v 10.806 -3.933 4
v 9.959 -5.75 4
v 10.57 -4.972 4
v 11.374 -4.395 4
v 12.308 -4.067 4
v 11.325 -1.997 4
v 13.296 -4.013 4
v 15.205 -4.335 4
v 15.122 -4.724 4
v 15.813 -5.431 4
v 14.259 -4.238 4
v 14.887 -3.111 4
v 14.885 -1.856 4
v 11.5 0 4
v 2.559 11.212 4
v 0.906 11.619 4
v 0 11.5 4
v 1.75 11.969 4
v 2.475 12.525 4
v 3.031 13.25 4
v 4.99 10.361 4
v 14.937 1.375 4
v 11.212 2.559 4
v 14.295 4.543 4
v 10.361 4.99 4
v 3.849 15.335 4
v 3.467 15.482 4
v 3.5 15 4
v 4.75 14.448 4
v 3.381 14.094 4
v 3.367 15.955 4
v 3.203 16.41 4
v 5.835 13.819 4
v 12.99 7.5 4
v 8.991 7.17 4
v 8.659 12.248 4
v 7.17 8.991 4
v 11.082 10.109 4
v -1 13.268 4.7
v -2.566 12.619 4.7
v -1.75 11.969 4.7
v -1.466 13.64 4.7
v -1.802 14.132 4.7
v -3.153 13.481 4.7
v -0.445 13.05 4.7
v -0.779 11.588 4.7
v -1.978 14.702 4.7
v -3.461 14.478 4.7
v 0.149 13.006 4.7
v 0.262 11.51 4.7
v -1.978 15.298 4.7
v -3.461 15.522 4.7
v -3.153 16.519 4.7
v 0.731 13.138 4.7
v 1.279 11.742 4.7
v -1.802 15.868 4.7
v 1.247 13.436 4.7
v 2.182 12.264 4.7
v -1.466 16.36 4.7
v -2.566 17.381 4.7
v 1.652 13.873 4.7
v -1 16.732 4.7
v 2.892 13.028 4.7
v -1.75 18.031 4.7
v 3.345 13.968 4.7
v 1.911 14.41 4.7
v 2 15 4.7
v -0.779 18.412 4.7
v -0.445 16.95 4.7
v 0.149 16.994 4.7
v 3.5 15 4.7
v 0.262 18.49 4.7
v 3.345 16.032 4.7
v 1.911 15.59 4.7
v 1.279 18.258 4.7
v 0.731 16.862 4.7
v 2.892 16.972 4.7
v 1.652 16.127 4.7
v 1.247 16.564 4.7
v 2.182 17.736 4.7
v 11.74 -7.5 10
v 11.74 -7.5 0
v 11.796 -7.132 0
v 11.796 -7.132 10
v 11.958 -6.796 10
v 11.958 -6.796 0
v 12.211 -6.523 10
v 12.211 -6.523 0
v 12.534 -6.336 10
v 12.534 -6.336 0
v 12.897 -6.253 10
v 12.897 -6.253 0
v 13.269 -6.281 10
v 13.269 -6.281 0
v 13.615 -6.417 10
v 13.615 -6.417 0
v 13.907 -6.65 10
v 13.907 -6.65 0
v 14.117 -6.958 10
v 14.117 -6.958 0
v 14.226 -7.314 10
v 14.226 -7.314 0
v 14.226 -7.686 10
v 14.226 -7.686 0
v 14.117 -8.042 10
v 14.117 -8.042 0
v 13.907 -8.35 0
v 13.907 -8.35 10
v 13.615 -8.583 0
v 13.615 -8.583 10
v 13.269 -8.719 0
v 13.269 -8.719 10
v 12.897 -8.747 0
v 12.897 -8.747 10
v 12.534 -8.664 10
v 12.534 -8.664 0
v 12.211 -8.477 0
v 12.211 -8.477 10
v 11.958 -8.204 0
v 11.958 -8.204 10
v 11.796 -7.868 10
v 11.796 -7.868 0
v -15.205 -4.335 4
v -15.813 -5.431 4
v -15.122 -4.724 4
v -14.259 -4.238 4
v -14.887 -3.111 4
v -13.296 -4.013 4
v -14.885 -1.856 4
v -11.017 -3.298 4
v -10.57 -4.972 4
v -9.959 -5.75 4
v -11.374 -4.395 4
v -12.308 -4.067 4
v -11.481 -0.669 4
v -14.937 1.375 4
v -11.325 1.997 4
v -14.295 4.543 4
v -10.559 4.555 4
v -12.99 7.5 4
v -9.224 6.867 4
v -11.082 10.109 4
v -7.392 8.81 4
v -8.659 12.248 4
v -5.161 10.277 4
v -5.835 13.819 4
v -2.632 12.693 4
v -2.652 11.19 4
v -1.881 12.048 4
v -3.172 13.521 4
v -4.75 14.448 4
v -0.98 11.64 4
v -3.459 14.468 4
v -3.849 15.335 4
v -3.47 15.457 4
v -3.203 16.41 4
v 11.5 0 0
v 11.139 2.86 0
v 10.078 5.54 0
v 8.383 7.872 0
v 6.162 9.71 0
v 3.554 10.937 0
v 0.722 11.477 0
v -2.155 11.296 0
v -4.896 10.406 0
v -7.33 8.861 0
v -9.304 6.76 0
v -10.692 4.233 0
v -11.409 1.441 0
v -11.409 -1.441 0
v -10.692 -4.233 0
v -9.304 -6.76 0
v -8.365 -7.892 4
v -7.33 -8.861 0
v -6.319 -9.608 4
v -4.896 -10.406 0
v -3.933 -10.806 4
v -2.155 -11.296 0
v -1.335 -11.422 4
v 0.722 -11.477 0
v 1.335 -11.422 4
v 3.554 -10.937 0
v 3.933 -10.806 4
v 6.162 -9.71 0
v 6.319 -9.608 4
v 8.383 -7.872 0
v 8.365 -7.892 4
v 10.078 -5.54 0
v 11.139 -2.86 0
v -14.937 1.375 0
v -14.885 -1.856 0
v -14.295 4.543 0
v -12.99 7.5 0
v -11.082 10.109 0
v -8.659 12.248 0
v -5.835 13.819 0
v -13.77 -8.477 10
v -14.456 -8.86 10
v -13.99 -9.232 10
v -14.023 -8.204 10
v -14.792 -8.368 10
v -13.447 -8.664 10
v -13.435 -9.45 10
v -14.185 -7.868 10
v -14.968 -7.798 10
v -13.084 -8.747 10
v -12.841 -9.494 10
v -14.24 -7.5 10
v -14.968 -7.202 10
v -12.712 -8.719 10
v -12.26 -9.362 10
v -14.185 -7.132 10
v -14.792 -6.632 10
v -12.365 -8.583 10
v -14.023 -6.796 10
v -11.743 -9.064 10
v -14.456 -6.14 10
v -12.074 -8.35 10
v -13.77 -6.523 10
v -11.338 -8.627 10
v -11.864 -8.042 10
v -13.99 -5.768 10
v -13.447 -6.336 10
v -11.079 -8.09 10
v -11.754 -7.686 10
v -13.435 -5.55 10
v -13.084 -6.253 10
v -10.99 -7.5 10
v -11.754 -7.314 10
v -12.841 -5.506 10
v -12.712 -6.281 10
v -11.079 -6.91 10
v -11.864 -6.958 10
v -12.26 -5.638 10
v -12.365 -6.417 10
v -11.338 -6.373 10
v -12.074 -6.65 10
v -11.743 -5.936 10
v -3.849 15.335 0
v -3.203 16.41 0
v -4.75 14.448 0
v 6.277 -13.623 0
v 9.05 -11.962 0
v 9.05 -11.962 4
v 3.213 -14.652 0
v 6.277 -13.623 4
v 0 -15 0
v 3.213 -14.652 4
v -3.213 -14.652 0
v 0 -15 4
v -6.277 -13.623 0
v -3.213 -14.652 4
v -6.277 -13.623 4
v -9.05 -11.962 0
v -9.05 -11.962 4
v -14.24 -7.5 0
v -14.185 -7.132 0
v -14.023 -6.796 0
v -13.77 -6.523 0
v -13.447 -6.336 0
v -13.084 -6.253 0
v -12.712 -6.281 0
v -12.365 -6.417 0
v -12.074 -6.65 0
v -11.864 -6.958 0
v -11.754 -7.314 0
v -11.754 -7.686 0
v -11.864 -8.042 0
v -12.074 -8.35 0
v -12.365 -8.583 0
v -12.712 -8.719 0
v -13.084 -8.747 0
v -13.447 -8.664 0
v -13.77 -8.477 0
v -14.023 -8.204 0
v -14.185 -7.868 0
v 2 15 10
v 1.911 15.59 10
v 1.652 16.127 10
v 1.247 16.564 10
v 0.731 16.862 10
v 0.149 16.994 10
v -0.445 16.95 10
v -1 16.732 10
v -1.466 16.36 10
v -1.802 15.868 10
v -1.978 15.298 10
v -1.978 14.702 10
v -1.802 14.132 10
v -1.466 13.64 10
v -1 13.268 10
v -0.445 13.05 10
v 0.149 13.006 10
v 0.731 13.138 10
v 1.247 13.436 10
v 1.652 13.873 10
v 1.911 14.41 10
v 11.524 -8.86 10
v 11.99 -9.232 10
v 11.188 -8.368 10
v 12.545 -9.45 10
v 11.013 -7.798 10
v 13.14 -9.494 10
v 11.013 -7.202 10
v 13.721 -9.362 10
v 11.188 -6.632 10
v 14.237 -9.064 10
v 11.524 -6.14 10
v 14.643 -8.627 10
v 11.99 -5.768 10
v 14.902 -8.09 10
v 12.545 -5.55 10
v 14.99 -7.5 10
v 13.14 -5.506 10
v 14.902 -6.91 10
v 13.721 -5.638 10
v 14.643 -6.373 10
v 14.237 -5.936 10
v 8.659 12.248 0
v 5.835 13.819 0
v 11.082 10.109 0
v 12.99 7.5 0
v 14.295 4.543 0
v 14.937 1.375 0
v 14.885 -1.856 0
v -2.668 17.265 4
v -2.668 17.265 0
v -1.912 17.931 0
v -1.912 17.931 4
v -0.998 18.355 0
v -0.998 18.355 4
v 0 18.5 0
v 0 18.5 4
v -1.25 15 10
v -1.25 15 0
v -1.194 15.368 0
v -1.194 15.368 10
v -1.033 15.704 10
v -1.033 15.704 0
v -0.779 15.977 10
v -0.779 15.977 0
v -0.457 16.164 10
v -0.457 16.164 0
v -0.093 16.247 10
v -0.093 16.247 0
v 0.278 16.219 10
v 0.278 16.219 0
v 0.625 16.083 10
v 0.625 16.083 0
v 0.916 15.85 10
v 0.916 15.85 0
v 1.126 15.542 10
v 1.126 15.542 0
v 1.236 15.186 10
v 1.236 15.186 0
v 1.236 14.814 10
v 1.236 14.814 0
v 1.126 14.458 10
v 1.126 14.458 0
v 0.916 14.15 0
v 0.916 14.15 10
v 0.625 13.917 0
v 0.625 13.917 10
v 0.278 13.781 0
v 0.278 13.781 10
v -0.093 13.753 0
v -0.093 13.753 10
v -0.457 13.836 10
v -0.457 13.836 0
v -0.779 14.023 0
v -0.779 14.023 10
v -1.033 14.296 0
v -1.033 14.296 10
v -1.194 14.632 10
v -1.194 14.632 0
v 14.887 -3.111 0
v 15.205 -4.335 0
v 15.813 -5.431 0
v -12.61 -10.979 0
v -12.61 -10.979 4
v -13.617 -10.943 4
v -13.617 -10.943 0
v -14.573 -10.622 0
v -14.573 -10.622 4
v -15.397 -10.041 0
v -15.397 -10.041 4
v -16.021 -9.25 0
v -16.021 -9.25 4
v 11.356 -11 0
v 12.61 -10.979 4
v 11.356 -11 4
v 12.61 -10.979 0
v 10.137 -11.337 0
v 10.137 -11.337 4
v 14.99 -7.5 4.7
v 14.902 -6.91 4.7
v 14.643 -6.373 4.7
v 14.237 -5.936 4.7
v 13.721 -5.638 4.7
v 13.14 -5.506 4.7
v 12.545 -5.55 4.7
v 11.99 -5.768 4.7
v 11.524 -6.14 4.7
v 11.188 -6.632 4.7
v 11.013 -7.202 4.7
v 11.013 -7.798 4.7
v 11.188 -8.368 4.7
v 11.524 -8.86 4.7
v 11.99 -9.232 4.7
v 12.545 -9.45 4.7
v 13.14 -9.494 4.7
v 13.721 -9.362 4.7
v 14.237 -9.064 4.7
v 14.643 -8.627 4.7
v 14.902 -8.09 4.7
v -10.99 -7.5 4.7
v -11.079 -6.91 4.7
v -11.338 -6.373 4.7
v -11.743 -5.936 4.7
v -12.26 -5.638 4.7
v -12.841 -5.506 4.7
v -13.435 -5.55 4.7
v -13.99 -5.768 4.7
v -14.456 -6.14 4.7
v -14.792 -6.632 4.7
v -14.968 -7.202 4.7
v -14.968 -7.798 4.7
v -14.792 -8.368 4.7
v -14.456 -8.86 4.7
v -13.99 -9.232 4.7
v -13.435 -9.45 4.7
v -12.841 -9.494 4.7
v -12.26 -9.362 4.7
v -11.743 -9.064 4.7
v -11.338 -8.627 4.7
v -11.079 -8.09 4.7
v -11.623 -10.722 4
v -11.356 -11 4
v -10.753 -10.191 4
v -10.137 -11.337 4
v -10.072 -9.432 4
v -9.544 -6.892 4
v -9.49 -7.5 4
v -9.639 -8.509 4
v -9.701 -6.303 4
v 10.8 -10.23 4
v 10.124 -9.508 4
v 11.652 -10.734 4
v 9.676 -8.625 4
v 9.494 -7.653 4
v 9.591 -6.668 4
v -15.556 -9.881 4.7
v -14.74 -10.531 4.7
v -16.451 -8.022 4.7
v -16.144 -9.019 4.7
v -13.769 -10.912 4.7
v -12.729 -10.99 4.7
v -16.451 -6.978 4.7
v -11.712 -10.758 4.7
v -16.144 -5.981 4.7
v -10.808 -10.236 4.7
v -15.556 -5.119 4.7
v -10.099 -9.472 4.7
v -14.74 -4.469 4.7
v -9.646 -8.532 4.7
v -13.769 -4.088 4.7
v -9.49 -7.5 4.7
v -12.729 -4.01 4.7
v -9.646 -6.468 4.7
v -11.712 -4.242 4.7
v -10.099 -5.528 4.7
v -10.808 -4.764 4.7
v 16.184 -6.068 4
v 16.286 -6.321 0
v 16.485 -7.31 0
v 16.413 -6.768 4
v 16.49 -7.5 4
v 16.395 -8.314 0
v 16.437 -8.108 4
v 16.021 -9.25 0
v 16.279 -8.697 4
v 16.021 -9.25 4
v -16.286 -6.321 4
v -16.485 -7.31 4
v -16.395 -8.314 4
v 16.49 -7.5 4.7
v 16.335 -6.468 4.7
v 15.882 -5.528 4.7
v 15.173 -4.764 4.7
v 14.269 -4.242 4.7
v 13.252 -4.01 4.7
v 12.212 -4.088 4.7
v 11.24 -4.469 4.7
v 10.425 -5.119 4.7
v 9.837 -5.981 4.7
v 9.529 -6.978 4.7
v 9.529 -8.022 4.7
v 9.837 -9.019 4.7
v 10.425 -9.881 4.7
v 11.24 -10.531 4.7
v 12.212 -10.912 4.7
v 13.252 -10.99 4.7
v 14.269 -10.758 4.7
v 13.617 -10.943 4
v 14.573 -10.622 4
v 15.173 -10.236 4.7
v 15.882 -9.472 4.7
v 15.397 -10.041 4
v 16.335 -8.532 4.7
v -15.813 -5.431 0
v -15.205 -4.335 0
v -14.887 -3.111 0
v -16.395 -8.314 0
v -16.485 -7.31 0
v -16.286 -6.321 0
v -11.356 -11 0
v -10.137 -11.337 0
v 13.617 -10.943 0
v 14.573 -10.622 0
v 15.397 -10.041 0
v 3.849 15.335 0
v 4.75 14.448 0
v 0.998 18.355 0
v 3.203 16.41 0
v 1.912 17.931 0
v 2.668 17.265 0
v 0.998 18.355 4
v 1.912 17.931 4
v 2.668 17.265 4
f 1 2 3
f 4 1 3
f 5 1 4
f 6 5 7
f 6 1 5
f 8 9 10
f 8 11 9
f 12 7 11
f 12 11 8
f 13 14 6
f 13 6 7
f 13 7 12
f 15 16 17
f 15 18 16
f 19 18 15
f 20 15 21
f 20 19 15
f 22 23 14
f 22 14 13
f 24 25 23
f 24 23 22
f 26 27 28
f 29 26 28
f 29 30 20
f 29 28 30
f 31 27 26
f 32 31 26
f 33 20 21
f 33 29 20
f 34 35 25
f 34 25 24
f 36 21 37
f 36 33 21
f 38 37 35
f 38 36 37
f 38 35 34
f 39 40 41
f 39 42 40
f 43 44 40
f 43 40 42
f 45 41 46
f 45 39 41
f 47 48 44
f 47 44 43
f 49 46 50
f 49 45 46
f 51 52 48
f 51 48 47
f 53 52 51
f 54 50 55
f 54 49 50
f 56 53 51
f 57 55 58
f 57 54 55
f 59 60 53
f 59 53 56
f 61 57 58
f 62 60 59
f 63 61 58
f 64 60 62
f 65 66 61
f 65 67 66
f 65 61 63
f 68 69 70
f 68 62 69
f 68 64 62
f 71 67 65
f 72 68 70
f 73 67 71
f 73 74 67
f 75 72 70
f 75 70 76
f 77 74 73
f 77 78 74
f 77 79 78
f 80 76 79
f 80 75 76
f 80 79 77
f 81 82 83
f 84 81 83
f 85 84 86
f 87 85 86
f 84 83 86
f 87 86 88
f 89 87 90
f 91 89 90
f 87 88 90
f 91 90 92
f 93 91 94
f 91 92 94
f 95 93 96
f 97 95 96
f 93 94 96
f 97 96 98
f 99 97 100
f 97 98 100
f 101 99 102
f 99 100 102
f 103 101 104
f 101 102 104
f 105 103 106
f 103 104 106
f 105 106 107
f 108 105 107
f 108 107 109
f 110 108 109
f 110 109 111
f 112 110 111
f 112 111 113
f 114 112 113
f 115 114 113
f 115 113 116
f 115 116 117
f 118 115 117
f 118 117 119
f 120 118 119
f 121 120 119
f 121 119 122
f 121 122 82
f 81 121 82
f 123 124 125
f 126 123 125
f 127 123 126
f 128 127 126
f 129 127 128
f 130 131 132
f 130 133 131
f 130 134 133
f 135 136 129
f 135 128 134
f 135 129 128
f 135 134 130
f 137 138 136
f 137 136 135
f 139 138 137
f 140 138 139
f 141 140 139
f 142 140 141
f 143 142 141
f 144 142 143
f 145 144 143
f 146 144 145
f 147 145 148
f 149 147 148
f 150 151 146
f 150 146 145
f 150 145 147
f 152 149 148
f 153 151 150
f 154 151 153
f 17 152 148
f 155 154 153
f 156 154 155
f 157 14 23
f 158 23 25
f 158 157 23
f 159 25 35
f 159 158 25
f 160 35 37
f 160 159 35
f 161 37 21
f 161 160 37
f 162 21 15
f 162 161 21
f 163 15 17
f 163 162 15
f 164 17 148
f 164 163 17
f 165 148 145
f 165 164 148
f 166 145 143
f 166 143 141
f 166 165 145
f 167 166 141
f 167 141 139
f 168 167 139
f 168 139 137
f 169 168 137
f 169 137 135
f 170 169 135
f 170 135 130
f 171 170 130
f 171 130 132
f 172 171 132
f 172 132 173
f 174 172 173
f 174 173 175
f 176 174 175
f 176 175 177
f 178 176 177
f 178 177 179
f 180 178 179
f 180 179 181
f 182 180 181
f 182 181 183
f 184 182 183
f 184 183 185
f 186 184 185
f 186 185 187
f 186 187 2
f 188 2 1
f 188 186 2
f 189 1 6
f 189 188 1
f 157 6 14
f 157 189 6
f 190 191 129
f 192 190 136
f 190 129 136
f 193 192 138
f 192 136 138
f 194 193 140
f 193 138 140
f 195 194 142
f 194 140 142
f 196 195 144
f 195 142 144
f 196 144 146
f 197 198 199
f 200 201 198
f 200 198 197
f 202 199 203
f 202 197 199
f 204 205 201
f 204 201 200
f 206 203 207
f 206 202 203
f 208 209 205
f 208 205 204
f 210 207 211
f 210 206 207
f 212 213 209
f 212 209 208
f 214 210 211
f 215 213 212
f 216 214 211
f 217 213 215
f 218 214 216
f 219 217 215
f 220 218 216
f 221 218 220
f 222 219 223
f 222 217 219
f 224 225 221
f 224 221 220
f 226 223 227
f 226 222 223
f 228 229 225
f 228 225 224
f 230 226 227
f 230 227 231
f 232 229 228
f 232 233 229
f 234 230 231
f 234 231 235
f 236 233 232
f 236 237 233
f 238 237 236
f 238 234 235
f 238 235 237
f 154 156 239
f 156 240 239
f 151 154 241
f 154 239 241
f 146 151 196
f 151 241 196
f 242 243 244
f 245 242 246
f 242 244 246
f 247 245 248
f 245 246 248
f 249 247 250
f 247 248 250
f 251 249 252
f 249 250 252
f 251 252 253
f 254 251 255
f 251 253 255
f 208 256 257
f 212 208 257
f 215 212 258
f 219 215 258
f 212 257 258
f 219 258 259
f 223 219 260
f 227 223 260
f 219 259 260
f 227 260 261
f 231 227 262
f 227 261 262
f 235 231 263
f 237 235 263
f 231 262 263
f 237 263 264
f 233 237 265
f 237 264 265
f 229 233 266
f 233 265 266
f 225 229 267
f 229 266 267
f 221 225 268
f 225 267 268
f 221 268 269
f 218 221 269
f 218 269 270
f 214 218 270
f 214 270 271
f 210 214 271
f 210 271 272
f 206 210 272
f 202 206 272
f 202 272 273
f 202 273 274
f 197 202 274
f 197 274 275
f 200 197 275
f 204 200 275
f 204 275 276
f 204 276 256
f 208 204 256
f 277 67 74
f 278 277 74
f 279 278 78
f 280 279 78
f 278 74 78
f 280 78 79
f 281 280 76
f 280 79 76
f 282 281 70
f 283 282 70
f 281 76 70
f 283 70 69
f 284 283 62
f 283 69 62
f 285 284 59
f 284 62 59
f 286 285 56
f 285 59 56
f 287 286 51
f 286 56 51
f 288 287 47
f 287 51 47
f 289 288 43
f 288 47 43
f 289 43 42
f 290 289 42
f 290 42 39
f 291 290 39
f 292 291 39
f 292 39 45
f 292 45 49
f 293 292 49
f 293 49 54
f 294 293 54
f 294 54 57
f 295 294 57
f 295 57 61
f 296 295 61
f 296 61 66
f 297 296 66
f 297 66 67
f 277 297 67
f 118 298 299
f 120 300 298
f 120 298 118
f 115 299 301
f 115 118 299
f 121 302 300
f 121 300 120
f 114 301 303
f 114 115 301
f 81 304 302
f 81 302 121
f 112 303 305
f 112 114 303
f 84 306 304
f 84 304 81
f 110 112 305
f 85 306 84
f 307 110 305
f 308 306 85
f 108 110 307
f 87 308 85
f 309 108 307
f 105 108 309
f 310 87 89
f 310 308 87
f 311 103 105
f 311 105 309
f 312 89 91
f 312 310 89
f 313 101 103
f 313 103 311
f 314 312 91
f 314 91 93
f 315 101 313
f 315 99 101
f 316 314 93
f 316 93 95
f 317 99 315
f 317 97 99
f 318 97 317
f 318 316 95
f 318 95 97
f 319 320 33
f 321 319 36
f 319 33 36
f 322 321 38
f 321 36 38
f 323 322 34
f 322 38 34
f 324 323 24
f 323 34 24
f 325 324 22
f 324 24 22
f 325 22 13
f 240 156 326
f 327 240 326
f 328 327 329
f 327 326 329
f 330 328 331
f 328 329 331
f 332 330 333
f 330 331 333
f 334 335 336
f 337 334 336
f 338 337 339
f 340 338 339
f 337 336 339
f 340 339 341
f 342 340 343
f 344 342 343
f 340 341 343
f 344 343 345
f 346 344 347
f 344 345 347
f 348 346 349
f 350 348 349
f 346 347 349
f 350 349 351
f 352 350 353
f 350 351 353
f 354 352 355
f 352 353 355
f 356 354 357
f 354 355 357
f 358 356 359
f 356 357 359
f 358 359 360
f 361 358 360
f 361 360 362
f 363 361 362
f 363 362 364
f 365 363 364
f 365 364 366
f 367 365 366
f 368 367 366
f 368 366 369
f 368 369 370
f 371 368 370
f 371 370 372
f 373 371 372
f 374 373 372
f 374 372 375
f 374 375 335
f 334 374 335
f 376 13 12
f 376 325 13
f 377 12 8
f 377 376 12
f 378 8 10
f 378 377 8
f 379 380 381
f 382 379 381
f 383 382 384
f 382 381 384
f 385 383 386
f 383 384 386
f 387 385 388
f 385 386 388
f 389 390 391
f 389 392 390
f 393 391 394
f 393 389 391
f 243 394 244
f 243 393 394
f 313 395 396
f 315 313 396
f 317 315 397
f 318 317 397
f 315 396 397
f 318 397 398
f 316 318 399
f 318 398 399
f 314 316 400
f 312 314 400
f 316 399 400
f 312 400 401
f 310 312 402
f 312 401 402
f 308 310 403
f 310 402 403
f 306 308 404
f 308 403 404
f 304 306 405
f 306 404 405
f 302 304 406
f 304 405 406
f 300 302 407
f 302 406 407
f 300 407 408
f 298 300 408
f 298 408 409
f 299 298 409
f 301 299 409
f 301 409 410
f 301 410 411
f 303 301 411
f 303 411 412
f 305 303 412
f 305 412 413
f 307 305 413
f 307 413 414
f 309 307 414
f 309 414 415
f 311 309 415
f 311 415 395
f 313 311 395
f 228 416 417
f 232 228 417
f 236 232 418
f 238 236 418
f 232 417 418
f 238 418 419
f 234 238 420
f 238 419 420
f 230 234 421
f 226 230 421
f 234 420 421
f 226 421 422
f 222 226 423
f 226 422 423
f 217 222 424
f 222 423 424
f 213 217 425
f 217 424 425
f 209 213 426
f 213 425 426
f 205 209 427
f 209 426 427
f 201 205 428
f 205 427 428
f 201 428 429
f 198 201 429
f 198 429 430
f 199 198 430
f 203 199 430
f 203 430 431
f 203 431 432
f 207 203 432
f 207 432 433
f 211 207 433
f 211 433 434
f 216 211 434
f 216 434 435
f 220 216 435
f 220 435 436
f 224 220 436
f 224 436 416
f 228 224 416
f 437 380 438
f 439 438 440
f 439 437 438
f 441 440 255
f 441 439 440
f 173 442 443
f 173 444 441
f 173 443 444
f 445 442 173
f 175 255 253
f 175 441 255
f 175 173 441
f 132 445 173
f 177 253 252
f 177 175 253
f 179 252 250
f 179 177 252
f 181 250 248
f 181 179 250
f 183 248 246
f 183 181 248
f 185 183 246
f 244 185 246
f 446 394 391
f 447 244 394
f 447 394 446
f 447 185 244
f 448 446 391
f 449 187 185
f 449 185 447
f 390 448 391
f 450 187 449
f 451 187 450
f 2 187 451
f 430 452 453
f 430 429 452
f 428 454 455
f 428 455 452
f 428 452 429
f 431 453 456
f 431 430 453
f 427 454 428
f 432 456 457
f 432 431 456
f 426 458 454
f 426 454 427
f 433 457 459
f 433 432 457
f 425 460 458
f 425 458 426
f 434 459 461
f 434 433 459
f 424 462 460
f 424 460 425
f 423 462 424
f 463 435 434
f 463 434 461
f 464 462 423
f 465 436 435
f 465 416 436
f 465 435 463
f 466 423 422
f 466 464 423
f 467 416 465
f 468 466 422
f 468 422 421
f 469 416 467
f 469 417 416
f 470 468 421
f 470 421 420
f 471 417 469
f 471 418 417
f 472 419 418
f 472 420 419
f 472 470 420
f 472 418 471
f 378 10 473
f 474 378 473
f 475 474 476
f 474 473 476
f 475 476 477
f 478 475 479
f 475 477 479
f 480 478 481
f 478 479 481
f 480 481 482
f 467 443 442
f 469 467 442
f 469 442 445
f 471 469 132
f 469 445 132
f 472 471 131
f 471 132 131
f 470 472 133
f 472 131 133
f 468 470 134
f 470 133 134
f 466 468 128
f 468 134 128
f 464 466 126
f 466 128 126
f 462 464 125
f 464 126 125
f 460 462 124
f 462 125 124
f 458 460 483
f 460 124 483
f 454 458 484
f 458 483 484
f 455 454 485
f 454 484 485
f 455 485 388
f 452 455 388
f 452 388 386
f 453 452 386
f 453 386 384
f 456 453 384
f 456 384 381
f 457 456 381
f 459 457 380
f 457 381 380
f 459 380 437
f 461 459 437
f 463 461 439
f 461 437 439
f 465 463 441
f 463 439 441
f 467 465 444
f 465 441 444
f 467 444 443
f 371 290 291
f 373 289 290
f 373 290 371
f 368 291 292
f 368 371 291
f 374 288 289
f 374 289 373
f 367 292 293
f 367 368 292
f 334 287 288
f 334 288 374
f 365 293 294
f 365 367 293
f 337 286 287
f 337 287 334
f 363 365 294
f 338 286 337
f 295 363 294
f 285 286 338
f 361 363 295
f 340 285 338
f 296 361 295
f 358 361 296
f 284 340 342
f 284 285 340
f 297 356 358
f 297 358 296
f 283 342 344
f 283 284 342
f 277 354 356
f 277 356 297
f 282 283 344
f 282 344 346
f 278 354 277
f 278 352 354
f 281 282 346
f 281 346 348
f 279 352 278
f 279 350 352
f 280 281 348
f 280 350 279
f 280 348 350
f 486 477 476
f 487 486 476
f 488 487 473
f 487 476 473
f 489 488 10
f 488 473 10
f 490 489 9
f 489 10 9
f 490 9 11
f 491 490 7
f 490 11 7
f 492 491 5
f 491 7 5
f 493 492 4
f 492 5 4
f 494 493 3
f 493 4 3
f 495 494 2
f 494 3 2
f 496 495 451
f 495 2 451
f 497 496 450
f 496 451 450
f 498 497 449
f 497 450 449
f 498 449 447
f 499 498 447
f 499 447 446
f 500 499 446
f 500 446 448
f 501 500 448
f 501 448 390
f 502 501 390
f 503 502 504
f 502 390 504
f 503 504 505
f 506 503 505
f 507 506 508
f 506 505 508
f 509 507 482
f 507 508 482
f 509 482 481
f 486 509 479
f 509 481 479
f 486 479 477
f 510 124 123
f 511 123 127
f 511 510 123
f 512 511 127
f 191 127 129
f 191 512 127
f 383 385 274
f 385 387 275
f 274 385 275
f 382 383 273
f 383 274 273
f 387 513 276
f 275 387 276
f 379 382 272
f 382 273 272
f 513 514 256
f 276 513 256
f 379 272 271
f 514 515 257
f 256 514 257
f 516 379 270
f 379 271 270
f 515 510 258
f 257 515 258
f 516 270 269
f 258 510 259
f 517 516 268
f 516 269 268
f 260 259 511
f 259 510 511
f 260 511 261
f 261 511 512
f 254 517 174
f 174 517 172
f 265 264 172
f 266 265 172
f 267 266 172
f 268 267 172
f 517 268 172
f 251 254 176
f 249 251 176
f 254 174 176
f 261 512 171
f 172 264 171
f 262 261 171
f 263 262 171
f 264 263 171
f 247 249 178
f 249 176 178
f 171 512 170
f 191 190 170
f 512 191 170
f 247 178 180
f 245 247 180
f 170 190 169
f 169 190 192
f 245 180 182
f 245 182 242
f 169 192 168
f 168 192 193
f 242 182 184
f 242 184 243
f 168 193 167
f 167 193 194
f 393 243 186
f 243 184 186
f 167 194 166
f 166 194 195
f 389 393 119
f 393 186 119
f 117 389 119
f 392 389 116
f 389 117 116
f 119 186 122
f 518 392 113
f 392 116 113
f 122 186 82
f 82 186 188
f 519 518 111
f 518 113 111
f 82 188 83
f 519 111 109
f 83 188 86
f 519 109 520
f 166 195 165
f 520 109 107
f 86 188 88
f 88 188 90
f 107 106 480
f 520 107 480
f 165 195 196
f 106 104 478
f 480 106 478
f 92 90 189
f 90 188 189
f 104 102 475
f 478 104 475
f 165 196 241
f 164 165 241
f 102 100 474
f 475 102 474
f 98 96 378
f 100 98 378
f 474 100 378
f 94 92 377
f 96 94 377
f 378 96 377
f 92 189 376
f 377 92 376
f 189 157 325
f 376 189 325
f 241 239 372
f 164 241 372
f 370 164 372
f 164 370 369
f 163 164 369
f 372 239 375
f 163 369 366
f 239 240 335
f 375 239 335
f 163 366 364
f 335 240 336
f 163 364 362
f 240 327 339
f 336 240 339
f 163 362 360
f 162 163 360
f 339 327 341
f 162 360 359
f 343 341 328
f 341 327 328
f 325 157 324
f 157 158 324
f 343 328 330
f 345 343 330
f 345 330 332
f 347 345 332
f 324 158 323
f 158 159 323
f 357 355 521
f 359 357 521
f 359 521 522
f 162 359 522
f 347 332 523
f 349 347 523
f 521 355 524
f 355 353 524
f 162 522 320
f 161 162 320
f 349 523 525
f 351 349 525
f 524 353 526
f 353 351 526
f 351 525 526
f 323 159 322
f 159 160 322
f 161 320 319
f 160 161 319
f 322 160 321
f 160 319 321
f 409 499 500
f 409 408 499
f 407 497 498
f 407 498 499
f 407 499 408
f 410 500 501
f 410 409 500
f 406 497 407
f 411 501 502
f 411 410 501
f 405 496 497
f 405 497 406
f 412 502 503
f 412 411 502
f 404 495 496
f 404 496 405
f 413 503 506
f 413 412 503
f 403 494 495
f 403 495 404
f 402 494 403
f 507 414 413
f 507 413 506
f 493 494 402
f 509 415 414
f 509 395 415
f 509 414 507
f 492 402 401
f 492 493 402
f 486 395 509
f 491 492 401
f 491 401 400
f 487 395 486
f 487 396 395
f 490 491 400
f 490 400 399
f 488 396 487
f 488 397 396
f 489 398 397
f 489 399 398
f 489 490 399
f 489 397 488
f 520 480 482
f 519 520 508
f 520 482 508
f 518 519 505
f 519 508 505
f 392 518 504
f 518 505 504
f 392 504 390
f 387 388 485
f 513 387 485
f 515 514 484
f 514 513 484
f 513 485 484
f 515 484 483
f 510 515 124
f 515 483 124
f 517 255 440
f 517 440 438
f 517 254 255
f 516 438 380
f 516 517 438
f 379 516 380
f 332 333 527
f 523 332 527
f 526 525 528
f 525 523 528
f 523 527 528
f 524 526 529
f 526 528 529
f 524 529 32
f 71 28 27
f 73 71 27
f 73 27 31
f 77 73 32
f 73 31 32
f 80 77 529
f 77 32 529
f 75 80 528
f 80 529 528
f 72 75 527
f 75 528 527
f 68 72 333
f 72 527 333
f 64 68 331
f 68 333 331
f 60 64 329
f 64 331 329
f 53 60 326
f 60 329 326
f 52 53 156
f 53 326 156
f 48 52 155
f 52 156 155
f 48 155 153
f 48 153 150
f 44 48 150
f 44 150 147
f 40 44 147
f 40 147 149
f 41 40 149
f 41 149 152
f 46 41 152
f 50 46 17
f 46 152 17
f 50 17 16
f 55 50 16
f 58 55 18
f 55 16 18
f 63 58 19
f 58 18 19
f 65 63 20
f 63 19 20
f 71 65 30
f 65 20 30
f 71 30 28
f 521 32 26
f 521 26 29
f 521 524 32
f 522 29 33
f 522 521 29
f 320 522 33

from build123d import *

# Parameters (mm, degrees)
SKETCH1_R                   = 18.5
SKETCH1_R_2                 = 11.5
BOSS_EXTRUDE1_DEPTH         = 4
SKETCH2_R                   = 2
BOSS_EXTRUDE2_DEPTH         = 6
TAP_DRILL_FOR_M3X0_5_TAP1_D = 2.5
CUT_EXTRUDE1_DEPTH          = 10
FILLET1_R                   = 5
SKETCH6_R                   = 3.5
SKETCH6_R_2                 = 2
BOSS_EXTRUDE3_DEPTH         = 0.7


with BuildPart() as part:
    # Sketch1 → Boss-Extrude1 (new body)
    with BuildSketch(Plane.XY):
        Circle(SKETCH1_R)
        Circle(SKETCH1_R_2, mode=Mode.SUBTRACT)
    extrude(amount=BOSS_EXTRUDE1_DEPTH)

    # Sketch2 → Boss-Extrude2 (add)
    with BuildSketch(Plane.XY.offset(4)):
        with Locations((0, 15)):
            Circle(SKETCH2_R)
        with Locations((12.990381057, -7.5)):
            Circle(SKETCH2_R)
        with Locations((-12.990381057, -7.5)):
            Circle(SKETCH2_R)
    extrude(amount=BOSS_EXTRUDE2_DEPTH)

    # Tap Drill for M3x0.5 Tap1 (through all)
    with Locations(Plane(origin=(0, 15, 10), x_dir=(1, 0, 0), z_dir=(0, 0, 1))):
        with Locations((0, 0), (12.990381057, -22.5), (-12.990381057, -22.5)):
            Hole(TAP_DRILL_FOR_M3X0_5_TAP1_D / 2)

    # Sketch5 → Cut-Extrude1 (cut)
    with BuildSketch(Plane.XY.offset(4)):
        with BuildLine():
            ThreePointArc((0, 18.5), (2.615259707, 17.326030238), (3.476098947, 14.591666667))
            ThreePointArc((3.476098947, 14.591666667), (12.990381057, 7.5), (14.37480349, -4.285443339))
            ThreePointArc((14.37480349, -4.285443339), (16.312412175, -6.398133741), (16.021470006, -9.249999937))
            ThreePointArc((16.021470006, -9.249999937), (16.021469952, 9.250000031), (0, 18.5))
        make_face()
        with BuildLine():
            ThreePointArc((-3.476098947, 14.591666667), (-2.615259707, 17.326030238), (0, 18.5))
            ThreePointArc((0, 18.5), (-16.021469952, 9.250000031), (-16.021470006, -9.249999937))
            ThreePointArc((-16.021470006, -9.249999937), (-16.312412175, -6.398133741), (-14.37480349, -4.285443339))
            ThreePointArc((-14.37480349, -4.285443339), (-12.990381057, 7.5), (-3.476098947, 14.591666667))
        make_face()
        with BuildLine():
            ThreePointArc((-10.898704543, -10.306223327), (-13.697152515, -10.927896455), (-16.021470006, -9.249999937))
            ThreePointArc((-16.021470006, -9.249999937), (0, -18.5), (16.021470006, -9.249999937))
            ThreePointArc((16.021470006, -9.249999937), (13.697152515, -10.927896455), (10.898704543, -10.306223327))
            ThreePointArc((10.898704543, -10.306223327), (0, -15), (-10.898704543, -10.306223327))
        make_face()
    extrude(amount=-CUT_EXTRUDE1_DEPTH, mode=Mode.SUBTRACT)

    # Fillet1
    fillet1_edges = [part.edges().sort_by_distance(p)[0] for p in [
        (-3.476098947, 14.591666667, 2),
        (-14.37480349, -4.285443339, 2),
        (14.37480349, -4.285443339, 2),
        (3.476098947, 14.591666667, 2),
        (-10.898704543, -10.306223327, 2),
        (10.898704543, -10.306223327, 2),
    ]]
    fillet(fillet1_edges, radius=FILLET1_R)

    # Sketch6 → Boss-Extrude3 (add)
    with BuildSketch(Plane.XY.offset(4)):
        with Locations((-12.990381057, -7.5)):
            Circle(SKETCH6_R)
        with Locations((-12.990381057, -7.5)):
            Circle(SKETCH6_R_2, mode=Mode.SUBTRACT)
        with Locations((0, 15)):
            Circle(SKETCH6_R)
        with Locations((0, 15)):
            Circle(SKETCH6_R_2, mode=Mode.SUBTRACT)
        with Locations((12.990381057, -7.5)):
            Circle(SKETCH6_R)
        with Locations((12.990381057, -7.5)):
            Circle(SKETCH6_R_2, mode=Mode.SUBTRACT)
    extrude(amount=BOSS_EXTRUDE3_DEPTH)


solid = part.part
